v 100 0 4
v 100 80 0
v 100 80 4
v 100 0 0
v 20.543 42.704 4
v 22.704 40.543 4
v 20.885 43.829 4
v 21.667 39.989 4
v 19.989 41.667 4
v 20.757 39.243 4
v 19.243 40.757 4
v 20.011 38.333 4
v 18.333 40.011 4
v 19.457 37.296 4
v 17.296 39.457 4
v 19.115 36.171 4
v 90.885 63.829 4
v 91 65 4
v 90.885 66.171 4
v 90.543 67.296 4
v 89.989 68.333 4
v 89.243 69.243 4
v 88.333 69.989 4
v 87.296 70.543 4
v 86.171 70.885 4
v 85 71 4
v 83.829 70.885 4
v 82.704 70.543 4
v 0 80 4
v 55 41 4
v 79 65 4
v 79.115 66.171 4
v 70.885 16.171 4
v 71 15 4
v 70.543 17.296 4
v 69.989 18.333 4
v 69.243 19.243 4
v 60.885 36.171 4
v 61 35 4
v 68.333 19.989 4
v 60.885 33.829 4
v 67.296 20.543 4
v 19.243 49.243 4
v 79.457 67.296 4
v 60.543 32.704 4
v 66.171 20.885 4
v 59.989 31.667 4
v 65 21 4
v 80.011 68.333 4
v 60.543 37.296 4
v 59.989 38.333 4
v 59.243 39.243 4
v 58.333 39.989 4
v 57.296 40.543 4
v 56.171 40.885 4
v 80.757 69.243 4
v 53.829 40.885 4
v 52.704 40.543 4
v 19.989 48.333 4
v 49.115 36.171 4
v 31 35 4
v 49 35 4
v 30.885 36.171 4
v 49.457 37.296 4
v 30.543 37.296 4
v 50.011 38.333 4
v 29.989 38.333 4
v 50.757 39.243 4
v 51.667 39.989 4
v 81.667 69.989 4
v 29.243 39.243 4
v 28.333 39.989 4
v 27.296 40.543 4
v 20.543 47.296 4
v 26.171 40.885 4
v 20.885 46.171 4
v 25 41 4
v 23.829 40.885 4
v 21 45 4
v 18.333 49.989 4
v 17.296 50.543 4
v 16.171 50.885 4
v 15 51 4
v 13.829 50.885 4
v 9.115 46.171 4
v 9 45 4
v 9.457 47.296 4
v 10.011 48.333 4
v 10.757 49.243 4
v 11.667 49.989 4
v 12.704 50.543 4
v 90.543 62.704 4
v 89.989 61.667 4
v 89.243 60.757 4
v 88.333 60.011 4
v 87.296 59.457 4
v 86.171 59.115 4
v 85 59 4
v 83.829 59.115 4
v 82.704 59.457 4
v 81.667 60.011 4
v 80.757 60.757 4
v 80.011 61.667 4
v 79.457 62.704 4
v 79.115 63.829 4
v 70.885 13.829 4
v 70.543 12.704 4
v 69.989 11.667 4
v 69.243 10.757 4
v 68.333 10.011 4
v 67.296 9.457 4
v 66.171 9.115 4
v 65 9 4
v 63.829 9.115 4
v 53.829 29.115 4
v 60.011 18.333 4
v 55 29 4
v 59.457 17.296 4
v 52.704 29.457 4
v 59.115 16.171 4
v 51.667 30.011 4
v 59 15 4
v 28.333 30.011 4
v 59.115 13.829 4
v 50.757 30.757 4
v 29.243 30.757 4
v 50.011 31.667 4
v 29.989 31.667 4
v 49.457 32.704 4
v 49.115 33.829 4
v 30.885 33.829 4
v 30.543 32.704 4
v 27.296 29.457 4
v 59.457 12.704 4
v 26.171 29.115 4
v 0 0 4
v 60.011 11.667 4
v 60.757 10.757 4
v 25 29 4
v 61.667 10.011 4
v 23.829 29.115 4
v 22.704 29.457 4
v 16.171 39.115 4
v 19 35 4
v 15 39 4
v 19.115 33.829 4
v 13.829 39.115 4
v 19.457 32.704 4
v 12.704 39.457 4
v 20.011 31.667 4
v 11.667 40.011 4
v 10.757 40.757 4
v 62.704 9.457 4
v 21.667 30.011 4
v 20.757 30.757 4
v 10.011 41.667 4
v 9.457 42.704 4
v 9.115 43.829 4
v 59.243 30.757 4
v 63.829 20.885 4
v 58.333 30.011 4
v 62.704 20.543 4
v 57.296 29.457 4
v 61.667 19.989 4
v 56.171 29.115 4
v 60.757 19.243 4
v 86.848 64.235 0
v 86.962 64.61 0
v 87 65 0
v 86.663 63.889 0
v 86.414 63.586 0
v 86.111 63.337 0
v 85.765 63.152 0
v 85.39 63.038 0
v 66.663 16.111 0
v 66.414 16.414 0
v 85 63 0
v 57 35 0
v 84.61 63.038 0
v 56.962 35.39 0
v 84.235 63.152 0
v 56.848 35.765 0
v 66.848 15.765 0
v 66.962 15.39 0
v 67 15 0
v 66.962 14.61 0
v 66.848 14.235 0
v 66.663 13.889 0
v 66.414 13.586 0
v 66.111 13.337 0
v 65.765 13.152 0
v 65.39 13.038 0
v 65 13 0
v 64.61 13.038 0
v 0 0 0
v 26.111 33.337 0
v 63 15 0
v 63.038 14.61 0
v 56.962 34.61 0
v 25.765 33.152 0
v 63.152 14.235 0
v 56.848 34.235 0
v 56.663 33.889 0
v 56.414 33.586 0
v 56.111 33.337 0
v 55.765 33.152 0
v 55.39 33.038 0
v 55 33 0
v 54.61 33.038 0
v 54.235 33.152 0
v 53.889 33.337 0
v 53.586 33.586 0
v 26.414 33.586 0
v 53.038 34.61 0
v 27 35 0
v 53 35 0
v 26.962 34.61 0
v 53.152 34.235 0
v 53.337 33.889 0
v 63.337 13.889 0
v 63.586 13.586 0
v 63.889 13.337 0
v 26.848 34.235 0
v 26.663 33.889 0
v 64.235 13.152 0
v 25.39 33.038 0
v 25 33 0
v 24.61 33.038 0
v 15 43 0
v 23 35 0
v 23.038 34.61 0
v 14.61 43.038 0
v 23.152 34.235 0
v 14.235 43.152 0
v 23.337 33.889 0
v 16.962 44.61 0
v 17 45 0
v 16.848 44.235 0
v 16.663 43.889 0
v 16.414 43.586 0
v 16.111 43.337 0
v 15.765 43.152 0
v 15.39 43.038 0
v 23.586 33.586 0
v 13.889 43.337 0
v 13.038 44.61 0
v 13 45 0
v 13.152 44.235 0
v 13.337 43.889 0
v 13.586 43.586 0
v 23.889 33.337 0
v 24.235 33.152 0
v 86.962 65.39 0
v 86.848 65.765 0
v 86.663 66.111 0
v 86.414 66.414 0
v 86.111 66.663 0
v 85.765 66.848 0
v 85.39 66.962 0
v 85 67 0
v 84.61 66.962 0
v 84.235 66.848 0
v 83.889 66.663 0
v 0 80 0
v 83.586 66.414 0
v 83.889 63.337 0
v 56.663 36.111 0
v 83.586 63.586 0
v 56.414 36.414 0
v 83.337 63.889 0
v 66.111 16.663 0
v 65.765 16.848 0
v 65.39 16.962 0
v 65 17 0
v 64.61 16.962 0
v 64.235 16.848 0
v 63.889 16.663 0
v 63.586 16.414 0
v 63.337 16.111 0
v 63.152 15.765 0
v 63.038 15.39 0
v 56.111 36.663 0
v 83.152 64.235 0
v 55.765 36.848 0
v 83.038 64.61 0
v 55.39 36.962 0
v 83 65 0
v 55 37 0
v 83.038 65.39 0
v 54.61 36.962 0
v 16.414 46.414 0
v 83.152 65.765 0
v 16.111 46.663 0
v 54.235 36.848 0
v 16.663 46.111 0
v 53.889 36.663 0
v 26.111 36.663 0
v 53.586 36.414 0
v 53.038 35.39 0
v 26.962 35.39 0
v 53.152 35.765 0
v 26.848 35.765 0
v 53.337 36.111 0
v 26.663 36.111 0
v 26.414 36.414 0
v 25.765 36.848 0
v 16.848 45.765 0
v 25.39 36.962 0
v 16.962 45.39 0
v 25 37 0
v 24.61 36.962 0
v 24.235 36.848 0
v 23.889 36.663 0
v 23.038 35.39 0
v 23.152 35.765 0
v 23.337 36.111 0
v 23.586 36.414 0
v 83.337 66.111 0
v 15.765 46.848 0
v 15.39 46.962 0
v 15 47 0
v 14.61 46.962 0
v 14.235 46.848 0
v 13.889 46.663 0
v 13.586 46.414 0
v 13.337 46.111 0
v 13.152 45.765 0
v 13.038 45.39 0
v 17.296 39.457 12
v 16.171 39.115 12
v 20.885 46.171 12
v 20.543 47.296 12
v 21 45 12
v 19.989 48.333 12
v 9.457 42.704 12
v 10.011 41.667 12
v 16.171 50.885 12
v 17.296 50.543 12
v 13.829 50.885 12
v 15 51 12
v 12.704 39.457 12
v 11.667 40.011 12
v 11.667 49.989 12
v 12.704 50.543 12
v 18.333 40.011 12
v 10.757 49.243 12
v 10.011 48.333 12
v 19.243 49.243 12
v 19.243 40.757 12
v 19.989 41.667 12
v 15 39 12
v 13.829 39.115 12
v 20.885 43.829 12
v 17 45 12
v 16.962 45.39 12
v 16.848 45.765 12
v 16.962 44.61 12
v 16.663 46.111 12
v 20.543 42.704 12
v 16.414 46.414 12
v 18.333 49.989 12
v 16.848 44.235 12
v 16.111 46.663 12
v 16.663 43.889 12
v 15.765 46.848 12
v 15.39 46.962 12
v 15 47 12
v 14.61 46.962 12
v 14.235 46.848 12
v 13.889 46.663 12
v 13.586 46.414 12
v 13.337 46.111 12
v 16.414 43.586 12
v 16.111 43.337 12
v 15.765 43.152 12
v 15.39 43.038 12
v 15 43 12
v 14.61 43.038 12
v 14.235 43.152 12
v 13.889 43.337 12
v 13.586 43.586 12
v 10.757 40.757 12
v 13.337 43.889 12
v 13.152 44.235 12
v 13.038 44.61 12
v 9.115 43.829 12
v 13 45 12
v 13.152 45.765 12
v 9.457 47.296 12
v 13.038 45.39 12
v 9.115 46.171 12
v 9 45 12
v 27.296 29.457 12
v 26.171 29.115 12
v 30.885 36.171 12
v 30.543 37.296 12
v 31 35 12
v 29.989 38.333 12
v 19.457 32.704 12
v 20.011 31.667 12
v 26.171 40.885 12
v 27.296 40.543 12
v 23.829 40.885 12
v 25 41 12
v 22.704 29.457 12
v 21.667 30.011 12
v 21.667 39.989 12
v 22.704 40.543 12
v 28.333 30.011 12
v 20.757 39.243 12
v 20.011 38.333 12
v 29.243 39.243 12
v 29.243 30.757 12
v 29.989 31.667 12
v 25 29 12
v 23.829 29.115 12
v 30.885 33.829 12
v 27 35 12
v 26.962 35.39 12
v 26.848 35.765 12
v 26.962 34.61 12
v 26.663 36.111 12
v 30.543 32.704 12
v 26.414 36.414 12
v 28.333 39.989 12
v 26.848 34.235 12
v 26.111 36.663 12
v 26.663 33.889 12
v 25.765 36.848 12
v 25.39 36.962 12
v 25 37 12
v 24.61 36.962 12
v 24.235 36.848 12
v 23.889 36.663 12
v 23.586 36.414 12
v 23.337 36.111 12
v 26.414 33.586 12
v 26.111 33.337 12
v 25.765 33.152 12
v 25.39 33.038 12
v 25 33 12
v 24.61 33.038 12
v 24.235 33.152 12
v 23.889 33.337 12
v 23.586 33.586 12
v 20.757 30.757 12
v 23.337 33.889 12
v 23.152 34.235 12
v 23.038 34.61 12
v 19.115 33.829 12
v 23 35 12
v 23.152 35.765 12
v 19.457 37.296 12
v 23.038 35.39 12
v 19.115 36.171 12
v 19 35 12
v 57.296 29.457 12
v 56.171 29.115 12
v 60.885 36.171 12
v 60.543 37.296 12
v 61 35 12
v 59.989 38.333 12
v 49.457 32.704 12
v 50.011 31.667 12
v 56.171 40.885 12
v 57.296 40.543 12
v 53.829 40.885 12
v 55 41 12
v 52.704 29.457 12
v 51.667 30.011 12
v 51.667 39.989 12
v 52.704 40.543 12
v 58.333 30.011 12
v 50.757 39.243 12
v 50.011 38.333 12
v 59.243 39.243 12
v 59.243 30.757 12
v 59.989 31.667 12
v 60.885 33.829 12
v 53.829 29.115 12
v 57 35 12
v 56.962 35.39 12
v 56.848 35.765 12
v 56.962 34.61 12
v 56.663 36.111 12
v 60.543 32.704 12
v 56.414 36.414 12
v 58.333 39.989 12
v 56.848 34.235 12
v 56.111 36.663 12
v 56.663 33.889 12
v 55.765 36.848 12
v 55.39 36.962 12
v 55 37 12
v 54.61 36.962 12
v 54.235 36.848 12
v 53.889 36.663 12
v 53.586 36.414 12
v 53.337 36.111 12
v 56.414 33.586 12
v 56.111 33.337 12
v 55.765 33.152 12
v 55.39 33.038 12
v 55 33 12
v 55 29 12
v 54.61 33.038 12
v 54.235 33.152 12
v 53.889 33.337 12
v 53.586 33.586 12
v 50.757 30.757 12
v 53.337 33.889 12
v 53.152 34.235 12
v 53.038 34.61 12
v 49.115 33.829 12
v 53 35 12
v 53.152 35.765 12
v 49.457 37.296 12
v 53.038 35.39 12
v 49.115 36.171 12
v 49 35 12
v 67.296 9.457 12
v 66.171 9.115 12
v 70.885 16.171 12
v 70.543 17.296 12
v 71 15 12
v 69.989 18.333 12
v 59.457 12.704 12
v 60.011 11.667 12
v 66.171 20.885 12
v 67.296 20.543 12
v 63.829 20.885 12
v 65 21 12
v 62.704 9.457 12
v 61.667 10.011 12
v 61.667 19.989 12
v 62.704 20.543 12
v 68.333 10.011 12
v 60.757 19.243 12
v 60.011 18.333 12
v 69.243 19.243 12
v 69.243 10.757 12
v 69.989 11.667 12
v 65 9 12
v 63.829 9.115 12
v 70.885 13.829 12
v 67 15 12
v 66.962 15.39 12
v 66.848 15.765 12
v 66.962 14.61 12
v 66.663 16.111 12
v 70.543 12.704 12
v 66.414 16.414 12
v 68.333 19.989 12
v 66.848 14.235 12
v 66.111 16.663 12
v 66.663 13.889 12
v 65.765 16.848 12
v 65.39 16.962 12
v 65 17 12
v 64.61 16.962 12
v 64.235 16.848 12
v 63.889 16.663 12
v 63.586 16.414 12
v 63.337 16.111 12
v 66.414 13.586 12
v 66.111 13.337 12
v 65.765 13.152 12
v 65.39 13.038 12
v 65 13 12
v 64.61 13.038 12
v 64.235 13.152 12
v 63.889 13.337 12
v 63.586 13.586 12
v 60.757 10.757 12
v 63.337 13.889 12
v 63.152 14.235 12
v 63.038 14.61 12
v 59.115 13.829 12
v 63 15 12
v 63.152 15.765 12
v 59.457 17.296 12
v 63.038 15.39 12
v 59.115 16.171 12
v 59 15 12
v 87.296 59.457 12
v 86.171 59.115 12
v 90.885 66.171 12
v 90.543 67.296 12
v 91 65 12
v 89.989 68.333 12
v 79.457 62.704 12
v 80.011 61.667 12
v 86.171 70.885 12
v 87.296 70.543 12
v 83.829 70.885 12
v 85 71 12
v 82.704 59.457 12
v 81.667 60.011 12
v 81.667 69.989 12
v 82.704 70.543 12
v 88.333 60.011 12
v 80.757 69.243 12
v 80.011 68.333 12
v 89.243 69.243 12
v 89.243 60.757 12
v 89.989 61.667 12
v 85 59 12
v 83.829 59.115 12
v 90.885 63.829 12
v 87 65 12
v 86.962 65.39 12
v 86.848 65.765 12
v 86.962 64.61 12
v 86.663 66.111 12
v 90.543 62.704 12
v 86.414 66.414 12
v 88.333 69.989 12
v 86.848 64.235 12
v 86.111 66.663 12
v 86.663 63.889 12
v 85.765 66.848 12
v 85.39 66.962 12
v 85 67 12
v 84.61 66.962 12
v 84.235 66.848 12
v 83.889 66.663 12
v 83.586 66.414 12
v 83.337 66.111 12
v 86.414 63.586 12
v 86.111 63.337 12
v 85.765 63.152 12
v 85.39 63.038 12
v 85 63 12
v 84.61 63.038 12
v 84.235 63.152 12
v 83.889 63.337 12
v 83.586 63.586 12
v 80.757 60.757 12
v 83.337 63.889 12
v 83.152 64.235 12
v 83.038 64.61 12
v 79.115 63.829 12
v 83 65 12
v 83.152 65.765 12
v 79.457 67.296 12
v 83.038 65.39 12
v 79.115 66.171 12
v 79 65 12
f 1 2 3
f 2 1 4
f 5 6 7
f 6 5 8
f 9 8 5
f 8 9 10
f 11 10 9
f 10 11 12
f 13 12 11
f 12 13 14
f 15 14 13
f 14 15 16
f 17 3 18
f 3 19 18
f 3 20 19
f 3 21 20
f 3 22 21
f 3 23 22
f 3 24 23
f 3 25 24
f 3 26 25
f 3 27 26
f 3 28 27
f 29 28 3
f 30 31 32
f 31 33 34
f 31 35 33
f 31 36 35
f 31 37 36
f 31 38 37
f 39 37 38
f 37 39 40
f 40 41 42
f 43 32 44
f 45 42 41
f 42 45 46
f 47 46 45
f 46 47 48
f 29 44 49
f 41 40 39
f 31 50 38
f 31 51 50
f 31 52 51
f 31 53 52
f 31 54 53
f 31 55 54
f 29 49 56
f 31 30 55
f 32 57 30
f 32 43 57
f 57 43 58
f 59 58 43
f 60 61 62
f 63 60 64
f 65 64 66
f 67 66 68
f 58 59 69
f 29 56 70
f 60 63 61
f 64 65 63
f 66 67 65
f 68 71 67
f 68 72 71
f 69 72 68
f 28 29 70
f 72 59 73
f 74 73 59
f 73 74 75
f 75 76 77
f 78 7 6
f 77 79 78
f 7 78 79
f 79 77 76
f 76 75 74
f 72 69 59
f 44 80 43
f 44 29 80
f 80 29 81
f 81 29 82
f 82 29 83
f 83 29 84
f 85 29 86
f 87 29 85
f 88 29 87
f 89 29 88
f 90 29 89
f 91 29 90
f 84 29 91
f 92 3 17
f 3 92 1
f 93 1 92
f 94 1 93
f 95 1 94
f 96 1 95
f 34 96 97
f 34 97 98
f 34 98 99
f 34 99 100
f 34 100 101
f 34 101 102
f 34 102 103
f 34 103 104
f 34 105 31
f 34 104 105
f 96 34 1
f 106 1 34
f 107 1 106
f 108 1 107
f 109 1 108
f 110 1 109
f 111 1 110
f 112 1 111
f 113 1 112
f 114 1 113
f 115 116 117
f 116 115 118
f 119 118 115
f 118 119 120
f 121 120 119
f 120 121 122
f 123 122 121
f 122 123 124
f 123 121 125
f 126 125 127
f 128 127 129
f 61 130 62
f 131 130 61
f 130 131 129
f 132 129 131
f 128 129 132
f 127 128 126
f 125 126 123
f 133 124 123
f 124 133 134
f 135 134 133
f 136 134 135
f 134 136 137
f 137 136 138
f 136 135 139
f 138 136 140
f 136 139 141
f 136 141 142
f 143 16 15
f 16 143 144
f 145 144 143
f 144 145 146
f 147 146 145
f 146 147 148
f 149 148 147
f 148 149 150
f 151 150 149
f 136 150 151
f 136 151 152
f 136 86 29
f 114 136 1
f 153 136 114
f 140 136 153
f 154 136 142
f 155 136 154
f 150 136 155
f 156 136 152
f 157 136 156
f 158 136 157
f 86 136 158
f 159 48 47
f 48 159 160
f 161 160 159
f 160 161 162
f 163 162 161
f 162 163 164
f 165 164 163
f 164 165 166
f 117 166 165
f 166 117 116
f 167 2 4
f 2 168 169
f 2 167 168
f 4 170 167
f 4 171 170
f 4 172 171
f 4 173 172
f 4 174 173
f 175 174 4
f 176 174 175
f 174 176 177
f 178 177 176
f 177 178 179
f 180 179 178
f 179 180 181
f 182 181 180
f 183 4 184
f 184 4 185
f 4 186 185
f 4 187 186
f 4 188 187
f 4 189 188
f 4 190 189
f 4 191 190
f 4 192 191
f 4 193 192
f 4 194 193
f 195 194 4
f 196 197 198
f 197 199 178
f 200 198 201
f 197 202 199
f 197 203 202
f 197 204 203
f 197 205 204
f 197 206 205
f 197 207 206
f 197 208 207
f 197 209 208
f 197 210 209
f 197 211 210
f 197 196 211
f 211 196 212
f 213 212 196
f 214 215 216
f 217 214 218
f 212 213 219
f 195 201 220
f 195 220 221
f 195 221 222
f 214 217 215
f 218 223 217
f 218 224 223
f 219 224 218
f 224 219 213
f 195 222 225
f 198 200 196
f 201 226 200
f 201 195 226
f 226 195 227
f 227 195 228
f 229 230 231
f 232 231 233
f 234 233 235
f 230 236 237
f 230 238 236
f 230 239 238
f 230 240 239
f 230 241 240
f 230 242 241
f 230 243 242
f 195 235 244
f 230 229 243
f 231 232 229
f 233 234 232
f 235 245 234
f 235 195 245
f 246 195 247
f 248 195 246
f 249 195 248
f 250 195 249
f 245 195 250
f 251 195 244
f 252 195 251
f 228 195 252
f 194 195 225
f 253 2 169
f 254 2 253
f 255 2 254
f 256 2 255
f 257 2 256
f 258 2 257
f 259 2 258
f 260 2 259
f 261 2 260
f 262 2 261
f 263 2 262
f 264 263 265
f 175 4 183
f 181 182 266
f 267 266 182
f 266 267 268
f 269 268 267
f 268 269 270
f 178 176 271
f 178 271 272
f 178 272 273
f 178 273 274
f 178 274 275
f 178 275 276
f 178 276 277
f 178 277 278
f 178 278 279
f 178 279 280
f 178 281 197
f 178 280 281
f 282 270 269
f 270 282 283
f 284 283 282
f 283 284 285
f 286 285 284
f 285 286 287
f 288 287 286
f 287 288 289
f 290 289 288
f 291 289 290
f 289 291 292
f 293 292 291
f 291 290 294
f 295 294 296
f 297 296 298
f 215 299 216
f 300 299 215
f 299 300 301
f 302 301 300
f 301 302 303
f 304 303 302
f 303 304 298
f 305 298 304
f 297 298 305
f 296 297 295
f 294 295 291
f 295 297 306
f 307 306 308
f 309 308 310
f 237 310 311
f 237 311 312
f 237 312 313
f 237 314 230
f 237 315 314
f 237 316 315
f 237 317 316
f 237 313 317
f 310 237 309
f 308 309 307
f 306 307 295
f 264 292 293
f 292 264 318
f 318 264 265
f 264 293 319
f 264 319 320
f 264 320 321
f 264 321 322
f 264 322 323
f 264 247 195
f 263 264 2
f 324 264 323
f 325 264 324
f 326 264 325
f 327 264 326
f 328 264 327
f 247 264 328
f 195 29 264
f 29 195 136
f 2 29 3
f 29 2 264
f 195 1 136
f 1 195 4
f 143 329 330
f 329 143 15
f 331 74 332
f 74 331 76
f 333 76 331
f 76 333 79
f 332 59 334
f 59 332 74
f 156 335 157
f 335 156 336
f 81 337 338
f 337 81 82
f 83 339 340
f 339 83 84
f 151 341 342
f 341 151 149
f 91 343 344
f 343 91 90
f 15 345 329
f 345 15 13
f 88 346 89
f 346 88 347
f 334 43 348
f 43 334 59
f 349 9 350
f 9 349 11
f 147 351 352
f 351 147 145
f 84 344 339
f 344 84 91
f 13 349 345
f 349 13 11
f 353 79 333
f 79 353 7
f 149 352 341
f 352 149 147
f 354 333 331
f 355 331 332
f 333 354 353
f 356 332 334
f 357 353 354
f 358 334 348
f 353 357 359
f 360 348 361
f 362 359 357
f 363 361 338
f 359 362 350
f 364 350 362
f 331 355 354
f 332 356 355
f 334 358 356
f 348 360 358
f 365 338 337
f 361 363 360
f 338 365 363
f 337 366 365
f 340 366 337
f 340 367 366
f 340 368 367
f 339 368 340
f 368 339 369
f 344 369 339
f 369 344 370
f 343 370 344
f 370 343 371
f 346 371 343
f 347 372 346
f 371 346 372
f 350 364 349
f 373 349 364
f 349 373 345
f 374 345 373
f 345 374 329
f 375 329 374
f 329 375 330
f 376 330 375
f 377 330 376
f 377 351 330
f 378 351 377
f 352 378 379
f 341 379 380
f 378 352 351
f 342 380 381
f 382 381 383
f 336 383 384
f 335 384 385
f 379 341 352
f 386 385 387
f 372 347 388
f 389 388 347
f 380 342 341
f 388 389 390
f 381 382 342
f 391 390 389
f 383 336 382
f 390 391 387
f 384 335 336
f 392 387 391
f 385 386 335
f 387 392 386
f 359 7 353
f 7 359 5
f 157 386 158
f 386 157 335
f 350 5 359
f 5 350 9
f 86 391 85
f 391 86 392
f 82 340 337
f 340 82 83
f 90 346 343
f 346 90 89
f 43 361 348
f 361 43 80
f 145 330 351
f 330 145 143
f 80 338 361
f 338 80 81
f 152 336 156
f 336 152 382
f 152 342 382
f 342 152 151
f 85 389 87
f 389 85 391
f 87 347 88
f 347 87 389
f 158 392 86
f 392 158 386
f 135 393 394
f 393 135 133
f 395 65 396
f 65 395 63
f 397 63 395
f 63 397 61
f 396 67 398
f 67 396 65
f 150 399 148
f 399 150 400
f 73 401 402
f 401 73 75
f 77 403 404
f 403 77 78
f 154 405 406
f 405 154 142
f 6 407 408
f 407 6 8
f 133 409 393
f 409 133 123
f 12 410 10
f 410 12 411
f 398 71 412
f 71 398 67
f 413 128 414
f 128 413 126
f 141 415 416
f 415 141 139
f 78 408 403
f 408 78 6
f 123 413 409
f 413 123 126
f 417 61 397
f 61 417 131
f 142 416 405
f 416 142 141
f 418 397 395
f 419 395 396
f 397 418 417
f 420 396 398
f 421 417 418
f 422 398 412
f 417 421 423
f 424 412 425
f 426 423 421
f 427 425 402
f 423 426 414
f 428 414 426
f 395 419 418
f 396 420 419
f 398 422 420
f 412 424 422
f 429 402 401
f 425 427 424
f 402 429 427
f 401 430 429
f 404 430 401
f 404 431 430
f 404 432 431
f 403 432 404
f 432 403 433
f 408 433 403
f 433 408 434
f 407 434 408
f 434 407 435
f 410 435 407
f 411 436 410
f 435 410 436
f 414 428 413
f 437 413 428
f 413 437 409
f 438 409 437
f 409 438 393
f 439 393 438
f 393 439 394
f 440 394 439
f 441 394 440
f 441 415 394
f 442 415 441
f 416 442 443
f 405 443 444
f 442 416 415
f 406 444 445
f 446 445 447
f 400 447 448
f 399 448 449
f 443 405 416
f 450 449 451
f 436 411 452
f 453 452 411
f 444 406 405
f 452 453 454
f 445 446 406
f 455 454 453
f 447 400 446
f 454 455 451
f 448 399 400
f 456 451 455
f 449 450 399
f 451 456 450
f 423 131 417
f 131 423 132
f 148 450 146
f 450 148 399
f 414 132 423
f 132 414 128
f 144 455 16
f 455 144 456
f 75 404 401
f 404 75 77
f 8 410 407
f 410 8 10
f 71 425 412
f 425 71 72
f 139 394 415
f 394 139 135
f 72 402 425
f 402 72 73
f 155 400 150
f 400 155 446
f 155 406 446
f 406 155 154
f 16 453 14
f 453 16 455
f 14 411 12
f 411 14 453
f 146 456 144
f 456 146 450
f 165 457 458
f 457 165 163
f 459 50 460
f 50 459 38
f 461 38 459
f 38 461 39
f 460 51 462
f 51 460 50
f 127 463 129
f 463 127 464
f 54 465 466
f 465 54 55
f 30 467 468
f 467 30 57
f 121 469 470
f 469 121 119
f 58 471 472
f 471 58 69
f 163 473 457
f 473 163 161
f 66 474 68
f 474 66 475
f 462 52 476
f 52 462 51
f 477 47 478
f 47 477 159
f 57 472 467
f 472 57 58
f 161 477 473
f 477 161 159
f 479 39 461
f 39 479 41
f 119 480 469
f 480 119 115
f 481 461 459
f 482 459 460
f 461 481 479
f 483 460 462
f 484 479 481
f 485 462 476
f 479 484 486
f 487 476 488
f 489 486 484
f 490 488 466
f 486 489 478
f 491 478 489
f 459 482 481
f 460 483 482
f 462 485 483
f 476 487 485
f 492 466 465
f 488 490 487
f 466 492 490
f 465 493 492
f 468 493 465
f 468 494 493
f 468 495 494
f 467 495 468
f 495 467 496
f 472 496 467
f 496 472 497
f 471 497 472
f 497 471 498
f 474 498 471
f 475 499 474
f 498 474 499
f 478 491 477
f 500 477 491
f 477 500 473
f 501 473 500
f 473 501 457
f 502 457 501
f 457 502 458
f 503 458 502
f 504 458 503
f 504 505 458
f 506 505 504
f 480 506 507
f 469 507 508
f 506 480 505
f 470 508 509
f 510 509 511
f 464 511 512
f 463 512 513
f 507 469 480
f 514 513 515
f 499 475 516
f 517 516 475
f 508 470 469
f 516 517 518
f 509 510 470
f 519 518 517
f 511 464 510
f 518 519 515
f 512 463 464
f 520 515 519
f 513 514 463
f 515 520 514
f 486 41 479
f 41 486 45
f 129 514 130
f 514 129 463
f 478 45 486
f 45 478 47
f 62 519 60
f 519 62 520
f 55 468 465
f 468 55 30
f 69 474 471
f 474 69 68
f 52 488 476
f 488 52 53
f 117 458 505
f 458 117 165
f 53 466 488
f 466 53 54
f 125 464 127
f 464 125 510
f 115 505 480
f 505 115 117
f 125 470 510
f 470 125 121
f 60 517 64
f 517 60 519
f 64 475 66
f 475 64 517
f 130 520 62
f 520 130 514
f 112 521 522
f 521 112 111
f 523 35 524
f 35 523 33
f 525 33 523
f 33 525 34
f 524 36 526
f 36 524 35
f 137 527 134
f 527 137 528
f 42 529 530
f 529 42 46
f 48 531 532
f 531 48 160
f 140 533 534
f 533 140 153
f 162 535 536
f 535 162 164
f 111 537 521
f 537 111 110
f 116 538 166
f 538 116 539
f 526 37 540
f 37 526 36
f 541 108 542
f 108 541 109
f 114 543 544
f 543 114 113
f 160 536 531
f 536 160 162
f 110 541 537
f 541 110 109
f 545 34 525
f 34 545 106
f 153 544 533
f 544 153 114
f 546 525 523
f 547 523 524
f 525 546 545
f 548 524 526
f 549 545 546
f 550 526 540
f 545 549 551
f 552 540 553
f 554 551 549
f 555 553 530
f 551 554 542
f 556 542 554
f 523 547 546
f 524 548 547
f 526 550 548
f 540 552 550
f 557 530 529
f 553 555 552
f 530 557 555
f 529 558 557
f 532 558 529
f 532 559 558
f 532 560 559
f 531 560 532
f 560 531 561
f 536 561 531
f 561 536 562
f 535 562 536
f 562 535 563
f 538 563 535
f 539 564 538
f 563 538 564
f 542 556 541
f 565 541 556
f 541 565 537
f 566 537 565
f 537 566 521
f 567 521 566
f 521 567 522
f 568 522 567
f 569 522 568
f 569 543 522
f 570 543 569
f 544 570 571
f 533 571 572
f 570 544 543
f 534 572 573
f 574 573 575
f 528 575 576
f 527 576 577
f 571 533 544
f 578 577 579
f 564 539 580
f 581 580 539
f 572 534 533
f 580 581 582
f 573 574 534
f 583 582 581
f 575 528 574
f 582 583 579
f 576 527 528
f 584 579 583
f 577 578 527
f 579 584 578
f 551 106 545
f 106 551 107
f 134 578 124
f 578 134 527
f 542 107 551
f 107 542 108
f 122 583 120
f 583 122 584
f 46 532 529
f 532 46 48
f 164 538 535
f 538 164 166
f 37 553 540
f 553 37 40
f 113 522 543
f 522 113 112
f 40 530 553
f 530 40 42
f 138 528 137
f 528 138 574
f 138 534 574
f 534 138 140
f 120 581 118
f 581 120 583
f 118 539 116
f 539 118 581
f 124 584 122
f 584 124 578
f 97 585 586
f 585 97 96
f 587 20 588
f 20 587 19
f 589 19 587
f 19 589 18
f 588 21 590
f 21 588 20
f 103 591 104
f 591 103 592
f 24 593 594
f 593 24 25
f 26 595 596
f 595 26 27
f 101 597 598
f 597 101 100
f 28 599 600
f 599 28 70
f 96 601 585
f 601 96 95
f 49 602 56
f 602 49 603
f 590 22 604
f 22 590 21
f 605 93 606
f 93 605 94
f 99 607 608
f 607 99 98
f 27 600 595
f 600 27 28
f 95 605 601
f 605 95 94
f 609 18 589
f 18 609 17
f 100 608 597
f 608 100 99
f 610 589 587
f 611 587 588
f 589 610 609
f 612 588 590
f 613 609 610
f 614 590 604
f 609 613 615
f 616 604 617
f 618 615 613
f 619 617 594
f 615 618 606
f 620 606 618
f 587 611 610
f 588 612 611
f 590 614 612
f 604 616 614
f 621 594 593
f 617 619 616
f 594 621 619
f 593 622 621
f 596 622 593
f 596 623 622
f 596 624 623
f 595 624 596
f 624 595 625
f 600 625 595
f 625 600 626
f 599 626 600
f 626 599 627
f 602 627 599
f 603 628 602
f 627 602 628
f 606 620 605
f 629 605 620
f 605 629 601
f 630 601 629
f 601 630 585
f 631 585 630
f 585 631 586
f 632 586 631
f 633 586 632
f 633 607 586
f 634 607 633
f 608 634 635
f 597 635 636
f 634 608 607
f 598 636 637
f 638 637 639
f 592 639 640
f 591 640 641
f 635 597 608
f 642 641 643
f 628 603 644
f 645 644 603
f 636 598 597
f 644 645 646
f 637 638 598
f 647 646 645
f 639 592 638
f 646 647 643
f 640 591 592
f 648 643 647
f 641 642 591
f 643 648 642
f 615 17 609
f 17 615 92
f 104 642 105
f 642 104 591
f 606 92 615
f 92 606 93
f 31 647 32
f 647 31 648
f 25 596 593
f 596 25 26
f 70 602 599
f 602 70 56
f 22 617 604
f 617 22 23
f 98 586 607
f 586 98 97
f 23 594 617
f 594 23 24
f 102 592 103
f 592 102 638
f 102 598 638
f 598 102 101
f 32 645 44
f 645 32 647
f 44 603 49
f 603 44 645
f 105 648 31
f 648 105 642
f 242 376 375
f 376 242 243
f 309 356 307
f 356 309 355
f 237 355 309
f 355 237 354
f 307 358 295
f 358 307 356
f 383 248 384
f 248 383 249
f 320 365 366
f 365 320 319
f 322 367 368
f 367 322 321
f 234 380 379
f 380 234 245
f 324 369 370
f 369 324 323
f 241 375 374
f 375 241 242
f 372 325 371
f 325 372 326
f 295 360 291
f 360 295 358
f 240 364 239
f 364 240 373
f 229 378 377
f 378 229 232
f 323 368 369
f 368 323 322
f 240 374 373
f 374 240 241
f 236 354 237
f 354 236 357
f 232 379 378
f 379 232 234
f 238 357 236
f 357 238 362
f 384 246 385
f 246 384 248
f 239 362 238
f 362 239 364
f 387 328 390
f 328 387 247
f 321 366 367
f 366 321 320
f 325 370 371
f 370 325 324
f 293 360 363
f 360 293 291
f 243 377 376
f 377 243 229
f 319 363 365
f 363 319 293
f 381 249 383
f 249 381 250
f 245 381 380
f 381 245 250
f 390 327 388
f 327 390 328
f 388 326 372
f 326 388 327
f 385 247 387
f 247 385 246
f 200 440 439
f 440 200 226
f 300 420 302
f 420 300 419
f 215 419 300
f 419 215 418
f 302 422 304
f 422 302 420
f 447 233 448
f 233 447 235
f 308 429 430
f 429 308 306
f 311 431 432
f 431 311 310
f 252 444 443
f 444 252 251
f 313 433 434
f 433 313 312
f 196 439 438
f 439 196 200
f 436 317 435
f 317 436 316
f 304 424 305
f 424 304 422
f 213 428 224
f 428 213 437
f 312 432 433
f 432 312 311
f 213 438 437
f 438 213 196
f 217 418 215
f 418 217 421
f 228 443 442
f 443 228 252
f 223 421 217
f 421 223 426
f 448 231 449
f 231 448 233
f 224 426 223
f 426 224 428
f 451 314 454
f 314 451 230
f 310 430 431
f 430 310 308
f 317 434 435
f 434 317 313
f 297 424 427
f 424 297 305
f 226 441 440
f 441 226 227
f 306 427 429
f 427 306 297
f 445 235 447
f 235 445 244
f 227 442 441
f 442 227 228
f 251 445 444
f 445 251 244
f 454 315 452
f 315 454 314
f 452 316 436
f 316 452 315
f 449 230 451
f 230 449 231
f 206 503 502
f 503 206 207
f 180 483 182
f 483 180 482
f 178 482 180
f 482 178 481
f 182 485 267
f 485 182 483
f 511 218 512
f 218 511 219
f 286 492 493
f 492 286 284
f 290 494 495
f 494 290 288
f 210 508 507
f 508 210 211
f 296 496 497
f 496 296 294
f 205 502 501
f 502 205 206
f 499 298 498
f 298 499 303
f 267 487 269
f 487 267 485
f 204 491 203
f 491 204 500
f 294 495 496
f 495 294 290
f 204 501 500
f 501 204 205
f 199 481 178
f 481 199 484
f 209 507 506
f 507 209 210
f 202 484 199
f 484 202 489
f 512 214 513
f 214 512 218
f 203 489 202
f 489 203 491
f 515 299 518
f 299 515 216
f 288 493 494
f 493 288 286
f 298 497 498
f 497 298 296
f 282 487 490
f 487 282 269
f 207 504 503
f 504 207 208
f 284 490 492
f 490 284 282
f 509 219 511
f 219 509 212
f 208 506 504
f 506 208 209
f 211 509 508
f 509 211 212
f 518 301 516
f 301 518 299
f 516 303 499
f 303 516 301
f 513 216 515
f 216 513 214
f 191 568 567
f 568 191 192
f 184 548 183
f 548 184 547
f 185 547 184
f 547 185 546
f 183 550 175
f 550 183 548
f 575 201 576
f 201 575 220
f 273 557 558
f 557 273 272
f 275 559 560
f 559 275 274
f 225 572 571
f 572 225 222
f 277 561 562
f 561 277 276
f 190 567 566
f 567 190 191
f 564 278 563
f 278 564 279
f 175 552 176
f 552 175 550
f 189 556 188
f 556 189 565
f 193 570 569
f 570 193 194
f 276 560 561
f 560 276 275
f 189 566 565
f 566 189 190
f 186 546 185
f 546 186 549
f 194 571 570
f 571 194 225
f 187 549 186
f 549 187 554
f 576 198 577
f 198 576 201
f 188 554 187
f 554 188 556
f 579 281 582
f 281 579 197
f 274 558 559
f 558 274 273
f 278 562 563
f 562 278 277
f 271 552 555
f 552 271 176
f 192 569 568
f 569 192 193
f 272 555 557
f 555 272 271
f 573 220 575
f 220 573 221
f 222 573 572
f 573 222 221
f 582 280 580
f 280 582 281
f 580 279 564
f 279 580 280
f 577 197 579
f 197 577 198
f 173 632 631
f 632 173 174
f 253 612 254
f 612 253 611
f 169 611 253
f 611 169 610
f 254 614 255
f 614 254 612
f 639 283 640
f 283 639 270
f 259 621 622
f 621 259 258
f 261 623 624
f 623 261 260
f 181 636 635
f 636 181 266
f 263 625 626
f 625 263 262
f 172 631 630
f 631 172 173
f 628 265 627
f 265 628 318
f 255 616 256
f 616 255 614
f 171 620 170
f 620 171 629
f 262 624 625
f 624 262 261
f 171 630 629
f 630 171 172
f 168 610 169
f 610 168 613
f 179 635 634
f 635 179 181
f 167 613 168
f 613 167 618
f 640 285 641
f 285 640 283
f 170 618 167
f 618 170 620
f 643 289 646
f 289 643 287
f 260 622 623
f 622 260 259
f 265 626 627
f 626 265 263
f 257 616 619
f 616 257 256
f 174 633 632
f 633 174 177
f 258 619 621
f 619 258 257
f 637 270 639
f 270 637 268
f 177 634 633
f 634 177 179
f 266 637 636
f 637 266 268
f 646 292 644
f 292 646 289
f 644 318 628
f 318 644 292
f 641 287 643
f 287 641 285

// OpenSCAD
$fn = 32;

// ----------------------------------------------------------------------
// Boss field: plate with bosses at given coordinates
// ----------------------------------------------------------------------

// --- parameters (mm) ---
plate_l = 100;            // plate length, X
plate_w = 80;             // plate width, Y
plate_t = 4;              // plate thickness, Z
boss_d = 12;              // boss diameter
boss_h = 8;               // boss height above the plate
bore_d = 4;               // boss bore

total_h = plate_t + boss_h;  // overall height

difference() {
  union() {
    cube([plate_l, plate_w, plate_t]);
    translate([15, 45, plate_t]) cylinder(h = boss_h, d = boss_d);
    translate([25, 35, plate_t]) cylinder(h = boss_h, d = boss_d);
    translate([55, 35, plate_t]) cylinder(h = boss_h, d = boss_d);
    translate([65, 15, plate_t]) cylinder(h = boss_h, d = boss_d);
    translate([85, 65, plate_t]) cylinder(h = boss_h, d = boss_d);
  }
  translate([15, 45, -1]) cylinder(h = total_h + 2, d = bore_d);
  translate([25, 35, -1]) cylinder(h = total_h + 2, d = bore_d);
  translate([55, 35, -1]) cylinder(h = total_h + 2, d = bore_d);
  translate([65, 15, -1]) cylinder(h = total_h + 2, d = bore_d);
  translate([85, 65, -1]) cylinder(h = total_h + 2, d = bore_d);
}
